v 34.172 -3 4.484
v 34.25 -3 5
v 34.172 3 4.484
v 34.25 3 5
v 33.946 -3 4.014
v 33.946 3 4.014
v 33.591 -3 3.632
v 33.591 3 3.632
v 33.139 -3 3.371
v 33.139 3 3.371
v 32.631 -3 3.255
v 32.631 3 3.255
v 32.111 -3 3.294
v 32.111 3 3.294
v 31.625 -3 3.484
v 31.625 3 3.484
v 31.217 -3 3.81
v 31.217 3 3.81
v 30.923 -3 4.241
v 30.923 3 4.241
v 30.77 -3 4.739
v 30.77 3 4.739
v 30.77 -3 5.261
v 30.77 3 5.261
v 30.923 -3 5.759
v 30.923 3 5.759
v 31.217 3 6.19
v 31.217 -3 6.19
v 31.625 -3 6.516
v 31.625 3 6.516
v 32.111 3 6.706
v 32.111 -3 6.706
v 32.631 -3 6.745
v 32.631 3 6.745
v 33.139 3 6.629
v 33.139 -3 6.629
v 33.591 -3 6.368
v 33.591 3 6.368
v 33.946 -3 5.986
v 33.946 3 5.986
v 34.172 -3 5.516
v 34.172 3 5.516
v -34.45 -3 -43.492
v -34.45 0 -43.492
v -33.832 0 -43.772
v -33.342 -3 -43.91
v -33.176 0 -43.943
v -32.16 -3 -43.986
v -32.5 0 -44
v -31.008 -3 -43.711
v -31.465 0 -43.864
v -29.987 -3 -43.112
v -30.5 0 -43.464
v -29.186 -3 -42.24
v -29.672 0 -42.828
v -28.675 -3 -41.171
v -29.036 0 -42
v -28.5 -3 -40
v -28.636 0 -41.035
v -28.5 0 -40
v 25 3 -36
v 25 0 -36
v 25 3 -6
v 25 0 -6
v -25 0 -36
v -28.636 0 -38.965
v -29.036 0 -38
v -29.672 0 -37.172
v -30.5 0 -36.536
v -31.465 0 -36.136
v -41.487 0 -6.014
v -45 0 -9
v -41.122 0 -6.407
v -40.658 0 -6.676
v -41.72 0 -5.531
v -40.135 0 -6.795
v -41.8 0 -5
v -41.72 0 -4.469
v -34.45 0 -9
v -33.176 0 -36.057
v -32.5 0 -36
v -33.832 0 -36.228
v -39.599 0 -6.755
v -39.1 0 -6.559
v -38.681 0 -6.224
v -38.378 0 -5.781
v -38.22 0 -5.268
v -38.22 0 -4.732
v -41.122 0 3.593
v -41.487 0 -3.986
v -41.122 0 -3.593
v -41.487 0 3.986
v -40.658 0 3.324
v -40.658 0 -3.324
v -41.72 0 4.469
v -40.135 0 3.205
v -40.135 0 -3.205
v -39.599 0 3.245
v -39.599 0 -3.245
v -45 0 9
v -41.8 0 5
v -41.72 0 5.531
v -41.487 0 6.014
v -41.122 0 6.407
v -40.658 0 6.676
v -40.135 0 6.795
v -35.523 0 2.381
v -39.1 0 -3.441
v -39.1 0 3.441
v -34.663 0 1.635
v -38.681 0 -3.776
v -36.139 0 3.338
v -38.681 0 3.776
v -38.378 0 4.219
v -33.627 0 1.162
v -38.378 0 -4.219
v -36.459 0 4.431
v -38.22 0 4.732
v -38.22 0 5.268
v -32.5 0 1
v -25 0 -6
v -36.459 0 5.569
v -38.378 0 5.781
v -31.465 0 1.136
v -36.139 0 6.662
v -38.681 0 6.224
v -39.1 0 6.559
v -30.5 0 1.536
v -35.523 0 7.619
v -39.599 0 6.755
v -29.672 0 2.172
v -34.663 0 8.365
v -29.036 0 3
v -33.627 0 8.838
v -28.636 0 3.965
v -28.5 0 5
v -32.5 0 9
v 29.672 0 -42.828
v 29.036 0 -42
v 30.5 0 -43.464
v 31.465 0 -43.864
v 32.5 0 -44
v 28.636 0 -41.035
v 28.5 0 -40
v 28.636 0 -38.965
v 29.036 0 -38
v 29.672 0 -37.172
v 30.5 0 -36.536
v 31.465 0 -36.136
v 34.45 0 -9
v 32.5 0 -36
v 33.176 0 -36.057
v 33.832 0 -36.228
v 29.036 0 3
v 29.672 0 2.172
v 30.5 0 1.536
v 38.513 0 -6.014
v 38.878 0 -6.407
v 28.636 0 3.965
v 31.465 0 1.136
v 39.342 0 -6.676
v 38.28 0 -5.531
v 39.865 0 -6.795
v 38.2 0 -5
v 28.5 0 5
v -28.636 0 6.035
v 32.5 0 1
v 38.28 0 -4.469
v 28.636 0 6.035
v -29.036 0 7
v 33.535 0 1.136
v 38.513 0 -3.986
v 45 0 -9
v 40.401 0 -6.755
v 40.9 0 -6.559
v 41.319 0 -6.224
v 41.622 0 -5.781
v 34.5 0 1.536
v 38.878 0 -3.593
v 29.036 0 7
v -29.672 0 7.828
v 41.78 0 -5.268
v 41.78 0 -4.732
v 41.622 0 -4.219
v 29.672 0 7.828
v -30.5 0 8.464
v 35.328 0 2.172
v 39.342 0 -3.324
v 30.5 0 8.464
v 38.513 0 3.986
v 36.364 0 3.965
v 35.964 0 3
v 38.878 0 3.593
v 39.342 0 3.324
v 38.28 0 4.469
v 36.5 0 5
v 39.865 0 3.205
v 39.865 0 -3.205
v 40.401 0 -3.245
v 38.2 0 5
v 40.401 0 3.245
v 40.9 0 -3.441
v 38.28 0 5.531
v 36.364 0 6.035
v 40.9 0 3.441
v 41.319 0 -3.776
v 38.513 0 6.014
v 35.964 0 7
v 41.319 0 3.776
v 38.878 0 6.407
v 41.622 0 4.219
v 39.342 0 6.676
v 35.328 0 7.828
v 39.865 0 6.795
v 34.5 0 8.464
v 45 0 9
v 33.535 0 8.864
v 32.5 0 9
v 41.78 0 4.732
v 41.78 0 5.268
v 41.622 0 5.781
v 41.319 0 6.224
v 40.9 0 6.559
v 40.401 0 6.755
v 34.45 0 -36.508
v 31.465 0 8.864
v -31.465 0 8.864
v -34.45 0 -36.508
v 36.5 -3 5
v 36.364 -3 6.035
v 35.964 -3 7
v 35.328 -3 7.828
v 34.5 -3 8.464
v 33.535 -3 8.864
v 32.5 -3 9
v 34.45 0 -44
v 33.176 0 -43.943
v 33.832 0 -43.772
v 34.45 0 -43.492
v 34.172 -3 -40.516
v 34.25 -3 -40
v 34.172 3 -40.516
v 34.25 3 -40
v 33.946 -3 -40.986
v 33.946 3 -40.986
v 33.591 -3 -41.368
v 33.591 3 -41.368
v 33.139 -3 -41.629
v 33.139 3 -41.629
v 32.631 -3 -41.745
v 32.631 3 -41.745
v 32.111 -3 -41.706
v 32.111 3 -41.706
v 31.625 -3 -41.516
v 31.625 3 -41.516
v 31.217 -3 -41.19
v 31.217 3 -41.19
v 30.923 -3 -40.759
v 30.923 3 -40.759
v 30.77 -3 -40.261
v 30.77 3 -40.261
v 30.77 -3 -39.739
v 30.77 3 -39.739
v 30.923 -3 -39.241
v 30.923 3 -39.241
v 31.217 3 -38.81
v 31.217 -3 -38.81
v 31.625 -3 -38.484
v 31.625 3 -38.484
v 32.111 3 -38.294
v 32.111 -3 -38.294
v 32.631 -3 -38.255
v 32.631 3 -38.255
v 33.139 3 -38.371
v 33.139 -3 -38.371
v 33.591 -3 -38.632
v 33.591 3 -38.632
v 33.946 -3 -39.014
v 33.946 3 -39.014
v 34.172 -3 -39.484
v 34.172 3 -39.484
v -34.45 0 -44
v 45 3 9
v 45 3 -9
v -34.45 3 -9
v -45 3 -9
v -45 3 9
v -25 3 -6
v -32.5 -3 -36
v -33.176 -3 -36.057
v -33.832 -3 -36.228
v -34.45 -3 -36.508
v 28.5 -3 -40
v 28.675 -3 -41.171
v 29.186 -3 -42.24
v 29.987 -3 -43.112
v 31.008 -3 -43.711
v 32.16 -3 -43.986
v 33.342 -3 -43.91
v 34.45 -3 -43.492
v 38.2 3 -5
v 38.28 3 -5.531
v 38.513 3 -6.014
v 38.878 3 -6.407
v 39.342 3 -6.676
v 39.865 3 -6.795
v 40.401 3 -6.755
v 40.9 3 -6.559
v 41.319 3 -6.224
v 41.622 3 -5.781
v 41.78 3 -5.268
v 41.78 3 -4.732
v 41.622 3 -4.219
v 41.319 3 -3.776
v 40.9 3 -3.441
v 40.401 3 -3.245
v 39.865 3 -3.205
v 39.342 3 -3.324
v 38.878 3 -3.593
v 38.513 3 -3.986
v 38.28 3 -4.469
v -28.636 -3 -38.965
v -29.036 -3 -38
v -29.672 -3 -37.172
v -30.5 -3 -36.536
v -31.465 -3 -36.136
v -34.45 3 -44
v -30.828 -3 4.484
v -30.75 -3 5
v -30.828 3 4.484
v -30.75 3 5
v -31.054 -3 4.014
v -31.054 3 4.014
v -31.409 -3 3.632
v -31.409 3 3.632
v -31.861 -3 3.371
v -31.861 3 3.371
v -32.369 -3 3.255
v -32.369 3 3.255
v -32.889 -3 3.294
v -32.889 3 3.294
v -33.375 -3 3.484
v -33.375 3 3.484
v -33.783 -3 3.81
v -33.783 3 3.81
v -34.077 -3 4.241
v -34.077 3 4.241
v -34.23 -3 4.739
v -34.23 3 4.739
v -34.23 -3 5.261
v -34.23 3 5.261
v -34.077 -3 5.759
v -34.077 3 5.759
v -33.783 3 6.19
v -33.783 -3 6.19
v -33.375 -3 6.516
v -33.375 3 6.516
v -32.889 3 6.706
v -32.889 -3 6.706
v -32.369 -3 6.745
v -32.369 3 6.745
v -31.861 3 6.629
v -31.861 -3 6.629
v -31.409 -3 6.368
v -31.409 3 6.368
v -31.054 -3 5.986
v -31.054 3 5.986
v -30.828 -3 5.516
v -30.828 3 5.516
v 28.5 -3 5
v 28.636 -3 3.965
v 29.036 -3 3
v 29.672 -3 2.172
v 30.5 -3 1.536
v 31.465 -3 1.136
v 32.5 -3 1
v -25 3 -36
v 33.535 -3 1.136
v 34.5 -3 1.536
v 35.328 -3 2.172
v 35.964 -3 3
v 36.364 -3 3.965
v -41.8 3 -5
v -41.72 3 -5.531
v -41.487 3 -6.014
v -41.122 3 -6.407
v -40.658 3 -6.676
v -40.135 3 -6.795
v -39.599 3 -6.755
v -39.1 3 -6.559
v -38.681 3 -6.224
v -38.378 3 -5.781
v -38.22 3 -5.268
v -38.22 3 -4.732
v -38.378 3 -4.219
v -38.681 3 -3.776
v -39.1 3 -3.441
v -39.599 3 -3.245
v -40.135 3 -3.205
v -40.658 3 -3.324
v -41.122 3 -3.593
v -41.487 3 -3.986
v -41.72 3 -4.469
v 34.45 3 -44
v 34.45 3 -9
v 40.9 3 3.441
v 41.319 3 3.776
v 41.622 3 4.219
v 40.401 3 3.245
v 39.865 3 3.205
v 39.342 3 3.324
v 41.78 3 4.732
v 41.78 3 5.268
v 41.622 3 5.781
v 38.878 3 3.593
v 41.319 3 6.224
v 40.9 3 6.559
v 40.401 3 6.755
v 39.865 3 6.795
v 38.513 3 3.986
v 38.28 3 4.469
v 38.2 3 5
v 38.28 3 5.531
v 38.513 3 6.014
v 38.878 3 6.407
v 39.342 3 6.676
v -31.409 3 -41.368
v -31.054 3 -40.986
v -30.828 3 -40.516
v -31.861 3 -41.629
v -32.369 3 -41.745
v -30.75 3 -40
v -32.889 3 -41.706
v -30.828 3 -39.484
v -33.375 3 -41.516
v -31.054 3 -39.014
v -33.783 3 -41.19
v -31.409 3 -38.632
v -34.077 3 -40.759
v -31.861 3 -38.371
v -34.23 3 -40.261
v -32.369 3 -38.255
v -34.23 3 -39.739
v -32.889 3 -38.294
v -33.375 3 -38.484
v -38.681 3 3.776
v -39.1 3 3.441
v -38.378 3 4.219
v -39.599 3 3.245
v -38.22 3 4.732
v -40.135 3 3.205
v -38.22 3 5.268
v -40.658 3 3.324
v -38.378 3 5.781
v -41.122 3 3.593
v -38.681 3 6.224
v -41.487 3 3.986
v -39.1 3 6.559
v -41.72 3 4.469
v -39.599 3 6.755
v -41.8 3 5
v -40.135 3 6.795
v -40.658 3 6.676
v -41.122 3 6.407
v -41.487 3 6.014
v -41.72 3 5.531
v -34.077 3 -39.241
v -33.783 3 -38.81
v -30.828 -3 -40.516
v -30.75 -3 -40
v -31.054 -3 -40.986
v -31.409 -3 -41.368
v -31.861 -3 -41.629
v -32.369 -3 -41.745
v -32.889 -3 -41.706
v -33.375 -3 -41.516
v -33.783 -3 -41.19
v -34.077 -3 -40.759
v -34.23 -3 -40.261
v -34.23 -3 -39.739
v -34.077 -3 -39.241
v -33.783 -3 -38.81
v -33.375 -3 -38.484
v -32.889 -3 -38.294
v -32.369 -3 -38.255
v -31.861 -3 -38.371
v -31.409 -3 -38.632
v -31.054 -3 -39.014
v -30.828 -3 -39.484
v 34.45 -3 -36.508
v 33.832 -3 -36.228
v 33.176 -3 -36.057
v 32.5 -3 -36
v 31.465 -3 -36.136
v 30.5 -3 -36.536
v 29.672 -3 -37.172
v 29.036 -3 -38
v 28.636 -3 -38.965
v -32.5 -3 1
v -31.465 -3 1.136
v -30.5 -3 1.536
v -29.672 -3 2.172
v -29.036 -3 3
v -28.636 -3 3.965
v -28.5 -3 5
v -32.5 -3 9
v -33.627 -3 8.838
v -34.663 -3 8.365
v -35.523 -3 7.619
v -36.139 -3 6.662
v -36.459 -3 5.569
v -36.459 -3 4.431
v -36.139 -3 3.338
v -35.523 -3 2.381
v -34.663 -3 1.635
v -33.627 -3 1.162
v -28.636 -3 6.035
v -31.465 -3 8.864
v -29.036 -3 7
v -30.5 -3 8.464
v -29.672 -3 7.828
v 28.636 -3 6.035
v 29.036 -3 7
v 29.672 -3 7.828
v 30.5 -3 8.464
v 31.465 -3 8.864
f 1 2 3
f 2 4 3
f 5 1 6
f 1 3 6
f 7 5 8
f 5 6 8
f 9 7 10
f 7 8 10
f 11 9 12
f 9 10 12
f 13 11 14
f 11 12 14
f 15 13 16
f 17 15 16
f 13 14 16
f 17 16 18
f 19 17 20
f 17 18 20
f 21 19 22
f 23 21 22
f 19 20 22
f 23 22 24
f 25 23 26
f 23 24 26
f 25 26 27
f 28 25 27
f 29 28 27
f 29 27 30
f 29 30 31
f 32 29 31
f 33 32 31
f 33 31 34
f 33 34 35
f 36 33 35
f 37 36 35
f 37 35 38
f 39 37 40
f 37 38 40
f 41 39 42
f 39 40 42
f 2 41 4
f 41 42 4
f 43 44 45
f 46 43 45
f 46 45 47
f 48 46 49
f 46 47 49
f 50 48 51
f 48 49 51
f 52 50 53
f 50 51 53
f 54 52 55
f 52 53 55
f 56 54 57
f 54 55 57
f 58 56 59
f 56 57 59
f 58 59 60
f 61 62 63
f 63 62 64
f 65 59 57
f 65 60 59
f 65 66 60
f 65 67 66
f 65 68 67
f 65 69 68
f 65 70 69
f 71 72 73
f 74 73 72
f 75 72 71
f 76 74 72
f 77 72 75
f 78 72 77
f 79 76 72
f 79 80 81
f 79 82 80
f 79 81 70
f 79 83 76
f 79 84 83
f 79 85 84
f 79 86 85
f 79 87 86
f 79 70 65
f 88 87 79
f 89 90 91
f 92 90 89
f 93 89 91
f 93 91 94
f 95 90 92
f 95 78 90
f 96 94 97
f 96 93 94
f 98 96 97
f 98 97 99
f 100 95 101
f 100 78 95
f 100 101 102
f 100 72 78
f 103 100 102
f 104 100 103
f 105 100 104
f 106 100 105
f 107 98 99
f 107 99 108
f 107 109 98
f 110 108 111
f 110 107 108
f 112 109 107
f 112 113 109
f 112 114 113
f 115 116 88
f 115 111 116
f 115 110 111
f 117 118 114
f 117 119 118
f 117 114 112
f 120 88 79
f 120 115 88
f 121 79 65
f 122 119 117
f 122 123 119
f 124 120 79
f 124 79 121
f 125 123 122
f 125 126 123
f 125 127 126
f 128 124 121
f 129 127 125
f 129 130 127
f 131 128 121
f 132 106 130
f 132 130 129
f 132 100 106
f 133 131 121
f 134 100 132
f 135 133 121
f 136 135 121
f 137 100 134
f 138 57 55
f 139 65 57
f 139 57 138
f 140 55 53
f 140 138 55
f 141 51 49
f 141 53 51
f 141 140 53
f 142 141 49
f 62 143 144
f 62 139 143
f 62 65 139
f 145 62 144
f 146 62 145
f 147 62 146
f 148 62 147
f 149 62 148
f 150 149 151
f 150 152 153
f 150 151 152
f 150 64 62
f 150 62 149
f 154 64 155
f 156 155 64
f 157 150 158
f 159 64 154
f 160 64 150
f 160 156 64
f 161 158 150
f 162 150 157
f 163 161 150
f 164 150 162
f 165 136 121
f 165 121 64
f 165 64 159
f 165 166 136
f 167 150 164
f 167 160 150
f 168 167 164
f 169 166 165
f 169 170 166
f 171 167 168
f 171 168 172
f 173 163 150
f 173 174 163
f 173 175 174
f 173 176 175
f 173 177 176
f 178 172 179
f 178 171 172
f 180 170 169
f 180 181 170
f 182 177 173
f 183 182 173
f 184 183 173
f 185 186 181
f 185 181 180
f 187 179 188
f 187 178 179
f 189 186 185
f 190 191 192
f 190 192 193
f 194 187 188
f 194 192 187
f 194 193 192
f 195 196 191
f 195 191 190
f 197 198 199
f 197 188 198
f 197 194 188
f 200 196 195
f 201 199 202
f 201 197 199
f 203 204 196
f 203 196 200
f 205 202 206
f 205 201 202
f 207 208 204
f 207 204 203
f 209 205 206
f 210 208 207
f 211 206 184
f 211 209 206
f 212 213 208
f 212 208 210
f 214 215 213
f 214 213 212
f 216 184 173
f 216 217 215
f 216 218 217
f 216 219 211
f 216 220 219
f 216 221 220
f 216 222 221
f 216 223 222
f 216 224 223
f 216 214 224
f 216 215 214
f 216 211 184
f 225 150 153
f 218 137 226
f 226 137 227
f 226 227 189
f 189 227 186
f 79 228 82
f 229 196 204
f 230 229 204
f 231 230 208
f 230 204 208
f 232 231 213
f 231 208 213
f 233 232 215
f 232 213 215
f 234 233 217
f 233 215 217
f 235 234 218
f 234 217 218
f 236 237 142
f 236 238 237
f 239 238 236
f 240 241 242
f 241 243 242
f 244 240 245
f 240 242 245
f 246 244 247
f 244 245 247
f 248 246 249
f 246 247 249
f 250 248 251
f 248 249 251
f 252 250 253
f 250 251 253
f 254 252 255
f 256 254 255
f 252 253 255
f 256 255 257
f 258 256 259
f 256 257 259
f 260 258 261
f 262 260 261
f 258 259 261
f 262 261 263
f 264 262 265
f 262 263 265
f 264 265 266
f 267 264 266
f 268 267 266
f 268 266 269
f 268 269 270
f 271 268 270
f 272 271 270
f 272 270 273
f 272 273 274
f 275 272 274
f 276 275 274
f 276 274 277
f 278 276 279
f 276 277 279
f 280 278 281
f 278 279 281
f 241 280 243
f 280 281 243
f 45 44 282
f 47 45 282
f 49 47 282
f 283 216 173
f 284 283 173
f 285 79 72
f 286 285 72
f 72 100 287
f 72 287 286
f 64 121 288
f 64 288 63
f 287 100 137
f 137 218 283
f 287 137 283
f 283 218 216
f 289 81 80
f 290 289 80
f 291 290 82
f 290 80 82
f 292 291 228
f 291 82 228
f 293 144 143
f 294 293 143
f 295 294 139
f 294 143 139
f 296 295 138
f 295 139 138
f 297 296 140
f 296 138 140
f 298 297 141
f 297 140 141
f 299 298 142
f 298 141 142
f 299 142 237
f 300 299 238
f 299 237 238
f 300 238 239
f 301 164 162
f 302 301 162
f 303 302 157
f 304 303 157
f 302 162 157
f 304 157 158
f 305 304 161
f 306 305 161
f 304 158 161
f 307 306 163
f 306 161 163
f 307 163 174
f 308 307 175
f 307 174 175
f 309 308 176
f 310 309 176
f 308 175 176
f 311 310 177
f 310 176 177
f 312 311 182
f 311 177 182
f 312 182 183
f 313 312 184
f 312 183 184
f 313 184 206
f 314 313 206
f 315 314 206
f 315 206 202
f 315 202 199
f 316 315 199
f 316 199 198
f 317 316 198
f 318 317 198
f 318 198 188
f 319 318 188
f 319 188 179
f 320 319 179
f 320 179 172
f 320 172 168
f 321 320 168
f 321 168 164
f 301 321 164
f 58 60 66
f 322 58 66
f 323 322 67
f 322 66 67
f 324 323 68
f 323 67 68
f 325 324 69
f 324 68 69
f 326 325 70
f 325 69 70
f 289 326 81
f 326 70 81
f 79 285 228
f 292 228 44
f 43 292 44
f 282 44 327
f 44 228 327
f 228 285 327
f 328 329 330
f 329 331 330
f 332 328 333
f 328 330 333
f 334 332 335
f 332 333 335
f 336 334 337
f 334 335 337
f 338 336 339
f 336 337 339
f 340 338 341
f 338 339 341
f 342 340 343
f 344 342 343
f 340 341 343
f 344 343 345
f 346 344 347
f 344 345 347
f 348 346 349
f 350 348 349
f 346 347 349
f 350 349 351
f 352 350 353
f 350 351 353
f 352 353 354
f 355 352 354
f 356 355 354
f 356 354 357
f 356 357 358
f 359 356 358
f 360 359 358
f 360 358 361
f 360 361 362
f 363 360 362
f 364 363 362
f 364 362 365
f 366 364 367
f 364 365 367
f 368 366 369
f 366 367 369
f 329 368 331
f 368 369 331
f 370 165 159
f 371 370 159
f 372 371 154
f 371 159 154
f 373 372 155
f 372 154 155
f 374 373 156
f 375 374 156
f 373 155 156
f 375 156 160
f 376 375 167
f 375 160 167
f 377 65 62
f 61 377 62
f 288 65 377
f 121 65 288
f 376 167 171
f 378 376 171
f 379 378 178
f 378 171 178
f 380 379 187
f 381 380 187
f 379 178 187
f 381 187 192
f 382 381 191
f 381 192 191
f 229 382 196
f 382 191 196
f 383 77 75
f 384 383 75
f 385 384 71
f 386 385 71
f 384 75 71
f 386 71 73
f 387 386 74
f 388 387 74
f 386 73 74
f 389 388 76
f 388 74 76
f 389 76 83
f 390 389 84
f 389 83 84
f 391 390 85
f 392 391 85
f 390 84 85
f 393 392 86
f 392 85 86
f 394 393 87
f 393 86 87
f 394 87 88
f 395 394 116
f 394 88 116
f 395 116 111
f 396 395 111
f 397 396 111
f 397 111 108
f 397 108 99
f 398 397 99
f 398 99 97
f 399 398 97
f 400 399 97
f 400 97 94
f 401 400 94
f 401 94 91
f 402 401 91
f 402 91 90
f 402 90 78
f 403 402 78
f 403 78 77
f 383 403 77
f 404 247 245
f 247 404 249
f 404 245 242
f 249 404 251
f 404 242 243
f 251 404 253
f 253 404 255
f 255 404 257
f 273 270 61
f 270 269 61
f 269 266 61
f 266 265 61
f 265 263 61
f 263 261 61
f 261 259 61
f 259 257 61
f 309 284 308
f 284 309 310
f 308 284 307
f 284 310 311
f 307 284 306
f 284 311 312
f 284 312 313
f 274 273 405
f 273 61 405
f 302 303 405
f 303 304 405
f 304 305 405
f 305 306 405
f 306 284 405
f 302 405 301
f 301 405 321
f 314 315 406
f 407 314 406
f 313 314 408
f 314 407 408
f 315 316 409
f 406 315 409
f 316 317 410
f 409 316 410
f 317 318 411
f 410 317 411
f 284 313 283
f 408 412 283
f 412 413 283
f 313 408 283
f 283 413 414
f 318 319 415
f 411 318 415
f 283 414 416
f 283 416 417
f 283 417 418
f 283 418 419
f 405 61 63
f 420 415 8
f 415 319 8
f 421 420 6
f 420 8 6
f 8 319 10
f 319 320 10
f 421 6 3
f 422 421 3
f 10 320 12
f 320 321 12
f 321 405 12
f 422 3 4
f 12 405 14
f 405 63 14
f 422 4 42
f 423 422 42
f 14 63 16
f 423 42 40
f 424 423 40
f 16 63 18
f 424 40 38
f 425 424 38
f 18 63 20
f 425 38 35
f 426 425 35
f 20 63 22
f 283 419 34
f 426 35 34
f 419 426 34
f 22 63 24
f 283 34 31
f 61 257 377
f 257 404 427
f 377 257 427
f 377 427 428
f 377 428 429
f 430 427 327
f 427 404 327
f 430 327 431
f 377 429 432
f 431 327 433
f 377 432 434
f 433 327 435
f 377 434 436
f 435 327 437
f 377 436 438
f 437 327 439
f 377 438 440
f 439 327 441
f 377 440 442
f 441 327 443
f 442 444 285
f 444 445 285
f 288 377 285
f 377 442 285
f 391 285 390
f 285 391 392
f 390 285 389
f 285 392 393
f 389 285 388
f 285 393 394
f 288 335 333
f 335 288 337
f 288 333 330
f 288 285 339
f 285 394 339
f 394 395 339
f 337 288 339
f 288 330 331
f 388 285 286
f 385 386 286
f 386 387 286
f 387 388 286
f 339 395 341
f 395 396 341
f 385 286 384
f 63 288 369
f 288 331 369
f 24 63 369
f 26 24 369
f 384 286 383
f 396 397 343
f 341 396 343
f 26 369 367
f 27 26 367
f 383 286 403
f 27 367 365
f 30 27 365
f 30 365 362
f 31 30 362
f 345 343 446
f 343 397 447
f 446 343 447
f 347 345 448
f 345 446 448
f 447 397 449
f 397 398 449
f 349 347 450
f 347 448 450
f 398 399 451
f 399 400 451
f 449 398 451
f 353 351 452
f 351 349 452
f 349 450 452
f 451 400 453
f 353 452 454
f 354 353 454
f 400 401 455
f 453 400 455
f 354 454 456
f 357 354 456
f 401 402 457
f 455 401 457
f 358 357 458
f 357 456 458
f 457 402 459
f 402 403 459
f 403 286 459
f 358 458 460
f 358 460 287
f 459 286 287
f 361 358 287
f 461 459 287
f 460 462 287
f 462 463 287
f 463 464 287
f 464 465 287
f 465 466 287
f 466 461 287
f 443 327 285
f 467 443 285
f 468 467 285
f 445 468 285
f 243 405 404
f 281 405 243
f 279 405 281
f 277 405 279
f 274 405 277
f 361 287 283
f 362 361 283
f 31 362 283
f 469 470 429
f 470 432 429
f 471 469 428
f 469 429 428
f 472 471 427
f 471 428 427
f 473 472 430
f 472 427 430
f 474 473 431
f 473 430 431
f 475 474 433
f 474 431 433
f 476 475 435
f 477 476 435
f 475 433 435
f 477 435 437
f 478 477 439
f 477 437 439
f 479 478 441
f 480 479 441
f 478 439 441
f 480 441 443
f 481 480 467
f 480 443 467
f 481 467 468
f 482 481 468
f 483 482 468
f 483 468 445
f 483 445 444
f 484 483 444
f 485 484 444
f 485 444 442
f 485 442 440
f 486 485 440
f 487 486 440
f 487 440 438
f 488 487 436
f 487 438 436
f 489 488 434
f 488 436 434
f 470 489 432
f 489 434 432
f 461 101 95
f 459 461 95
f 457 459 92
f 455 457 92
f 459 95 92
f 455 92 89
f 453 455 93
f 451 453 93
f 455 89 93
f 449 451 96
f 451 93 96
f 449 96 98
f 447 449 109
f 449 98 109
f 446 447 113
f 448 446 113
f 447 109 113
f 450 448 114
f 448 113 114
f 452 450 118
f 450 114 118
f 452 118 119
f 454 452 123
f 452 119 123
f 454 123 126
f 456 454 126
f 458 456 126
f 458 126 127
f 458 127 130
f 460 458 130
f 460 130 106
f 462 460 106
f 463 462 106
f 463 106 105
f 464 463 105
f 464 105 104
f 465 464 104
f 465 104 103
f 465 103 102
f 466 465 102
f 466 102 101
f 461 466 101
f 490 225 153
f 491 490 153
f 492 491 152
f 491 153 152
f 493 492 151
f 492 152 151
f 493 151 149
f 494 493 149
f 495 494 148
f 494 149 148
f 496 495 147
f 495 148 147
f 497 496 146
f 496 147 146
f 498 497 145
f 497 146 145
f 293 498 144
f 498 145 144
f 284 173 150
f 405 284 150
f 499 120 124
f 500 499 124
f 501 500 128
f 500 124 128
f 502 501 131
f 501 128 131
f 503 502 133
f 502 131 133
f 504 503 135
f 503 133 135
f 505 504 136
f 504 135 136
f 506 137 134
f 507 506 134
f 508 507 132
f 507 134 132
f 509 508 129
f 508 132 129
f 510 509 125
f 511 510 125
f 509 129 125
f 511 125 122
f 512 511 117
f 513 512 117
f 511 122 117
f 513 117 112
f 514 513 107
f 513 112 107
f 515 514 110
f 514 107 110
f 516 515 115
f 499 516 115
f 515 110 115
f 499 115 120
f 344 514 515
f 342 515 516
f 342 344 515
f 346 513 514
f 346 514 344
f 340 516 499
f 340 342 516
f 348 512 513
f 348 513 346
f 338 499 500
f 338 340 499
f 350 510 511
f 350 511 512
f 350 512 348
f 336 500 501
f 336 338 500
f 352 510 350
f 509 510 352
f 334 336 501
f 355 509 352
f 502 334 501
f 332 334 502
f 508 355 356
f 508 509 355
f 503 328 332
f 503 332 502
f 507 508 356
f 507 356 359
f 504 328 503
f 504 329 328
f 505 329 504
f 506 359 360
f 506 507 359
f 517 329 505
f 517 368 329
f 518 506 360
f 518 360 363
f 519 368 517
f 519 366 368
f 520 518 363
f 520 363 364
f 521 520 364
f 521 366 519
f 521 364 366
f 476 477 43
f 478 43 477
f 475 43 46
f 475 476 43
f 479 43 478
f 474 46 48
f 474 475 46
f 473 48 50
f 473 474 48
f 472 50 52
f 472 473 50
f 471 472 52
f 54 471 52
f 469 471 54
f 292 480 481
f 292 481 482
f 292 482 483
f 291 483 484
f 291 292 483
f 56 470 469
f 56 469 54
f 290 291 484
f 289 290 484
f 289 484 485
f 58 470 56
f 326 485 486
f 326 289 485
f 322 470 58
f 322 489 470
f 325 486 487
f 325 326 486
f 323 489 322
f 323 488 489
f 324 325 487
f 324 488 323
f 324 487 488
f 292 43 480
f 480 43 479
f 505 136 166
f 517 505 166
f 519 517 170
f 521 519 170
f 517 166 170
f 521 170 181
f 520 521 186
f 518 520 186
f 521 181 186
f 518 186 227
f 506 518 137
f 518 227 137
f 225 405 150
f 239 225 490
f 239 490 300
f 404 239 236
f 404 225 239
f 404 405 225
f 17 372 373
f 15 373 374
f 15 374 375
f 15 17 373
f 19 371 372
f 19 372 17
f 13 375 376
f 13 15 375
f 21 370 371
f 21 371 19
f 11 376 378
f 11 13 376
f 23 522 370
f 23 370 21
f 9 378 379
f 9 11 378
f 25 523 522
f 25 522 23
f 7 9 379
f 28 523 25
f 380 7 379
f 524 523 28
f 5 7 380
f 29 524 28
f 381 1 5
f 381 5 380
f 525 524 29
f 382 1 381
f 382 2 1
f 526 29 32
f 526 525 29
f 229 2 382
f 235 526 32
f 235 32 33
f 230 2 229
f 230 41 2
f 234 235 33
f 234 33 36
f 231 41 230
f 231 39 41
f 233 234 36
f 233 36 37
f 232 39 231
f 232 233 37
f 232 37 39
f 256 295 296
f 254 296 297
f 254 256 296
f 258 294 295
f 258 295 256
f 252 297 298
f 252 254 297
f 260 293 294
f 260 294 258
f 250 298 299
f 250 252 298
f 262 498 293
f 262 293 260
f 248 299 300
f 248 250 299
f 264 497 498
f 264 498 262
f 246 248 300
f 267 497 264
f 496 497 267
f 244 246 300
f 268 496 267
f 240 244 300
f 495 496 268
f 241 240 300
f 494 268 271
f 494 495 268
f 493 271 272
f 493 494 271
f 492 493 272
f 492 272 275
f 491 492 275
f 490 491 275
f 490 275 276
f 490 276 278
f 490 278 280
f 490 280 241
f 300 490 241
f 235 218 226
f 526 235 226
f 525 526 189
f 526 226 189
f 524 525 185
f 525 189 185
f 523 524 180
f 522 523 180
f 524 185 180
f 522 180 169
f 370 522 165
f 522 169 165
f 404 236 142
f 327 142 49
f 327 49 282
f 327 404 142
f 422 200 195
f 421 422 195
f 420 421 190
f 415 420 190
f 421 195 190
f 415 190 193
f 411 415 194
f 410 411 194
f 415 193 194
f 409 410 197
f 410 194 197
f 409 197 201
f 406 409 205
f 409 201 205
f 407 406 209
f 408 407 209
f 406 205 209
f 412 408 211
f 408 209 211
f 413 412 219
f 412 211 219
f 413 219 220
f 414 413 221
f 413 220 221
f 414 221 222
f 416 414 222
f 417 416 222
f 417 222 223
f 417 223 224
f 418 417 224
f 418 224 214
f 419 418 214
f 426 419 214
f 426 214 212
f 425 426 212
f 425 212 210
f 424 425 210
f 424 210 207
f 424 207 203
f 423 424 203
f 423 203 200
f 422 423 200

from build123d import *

# Parameters (mm, degrees)
SKETCH1_W                 = 90
SKETCH1_H                 = 18
BOSS_EXTRUDE1_DEPTH       = 3
SKETCH1_3_W               = 69.7
SKETCH1_3_H               = 18
BOSS_EXTRUDE2_DEPTH       = 8
M3_CLEARANCE_HOLE1_D      = 3.6
M3_CLEARANCE_HOLE1_DEPTH  = 10
M3_CLEARANCE_HOLE1_TIP    = 1.081549114
SKETCH6_W                 = 69.7
SKETCH6_H                 = 37
BOSS_EXTRUDE3_DEPTH       = 5
SKETCH9_R                 = 4
BOSS_EXTRUDE4_DEPTH       = 3
F_3_0MM_DOWEL_HOLE1_D     = 3.5
F_3_0MM_DOWEL_HOLE1_DEPTH = 6
F_3_0MM_DOWEL_HOLE1_TIP   = 1.051506083
SKETCH12_W                = 50
SKETCH12_H                = 30
CUT_EXTRUDE1_DEPTH        = 65.845971347
CUT_EXTRUDE2_DEPTH        = 93.498770262
SKETCH15_W                = 69.7
SKETCH15_H                = 3
CUT_EXTRUDE3_DEPTH        = 2
SKETCH16_W                = 35
SKETCH16_H                = 8.236372104
CUT_EXTRUDE4_DEPTH        = 0.4


with BuildPart() as part:
    # Sketch1 → Boss-Extrude1 (new body)
    with BuildSketch(Plane(origin=(0, 0, 0), x_dir=(1, 0, 0), z_dir=(0, 1, 0))):
        Rectangle(SKETCH1_W, SKETCH1_H)
    extrude(amount=BOSS_EXTRUDE1_DEPTH)

    # Sketch1<3> → Boss-Extrude2 (add)
    with BuildSketch(Plane(origin=(0, 0, 0), x_dir=(1, 0, 0), z_dir=(0, 1, 0))):
        Rectangle(SKETCH1_3_W, SKETCH1_3_H)
    extrude(amount=BOSS_EXTRUDE2_DEPTH)

    # M3 Clearance Hole1
    with Locations(Plane(origin=(0, 3, 0), x_dir=(1, 0, 0), z_dir=(0, 1, 0))):
        with Locations((-40, 5), (-40, -5), (40, -5), (40, 5)):
            Hole(M3_CLEARANCE_HOLE1_D / 2, depth=M3_CLEARANCE_HOLE1_DEPTH)
            with Locations((0, 0, -(M3_CLEARANCE_HOLE1_DEPTH + M3_CLEARANCE_HOLE1_TIP / 2))):  # 118° drill point
                Cone(0, M3_CLEARANCE_HOLE1_D / 2, M3_CLEARANCE_HOLE1_TIP, mode=Mode.SUBTRACT)

    # Sketch6 → Boss-Extrude3 (add)
    with BuildSketch(Plane.XZ):
        with Locations((0, -27.5)):
            Rectangle(SKETCH6_W, SKETCH6_H)
    extrude(amount=-BOSS_EXTRUDE3_DEPTH)

    # Sketch9 → Boss-Extrude4 (add)
    with BuildSketch(Plane.XZ):
        with Locations((-32.5, 5)):
            Circle(SKETCH9_R)
        with Locations((32.5, 5)):
            Circle(SKETCH9_R)
        with BuildLine():
            Line((-34.85, -36.763103338), (-34.85, -43.236896662))
            ThreePointArc((-34.85, -43.236896662), (-28.5, -40), (-34.85, -36.763103338))
        make_face()
        with BuildLine():
            ThreePointArc((34.85, -36.763103338), (28.5, -40), (34.85, -43.236896662))
            Line((34.85, -43.236896662), (34.85, -36.763103338))
        make_face()
    extrude(amount=BOSS_EXTRUDE4_DEPTH)

    # Ø3.0mm Dowel Hole1
    with Locations(Plane(origin=(0, -3, 0), x_dir=(-1, 0, 0), z_dir=(0, -1, 0))):
        with Locations((-32.5, -5), (32.5, -5), (32.5, 40), (-32.5, 40)):
            Hole(F_3_0MM_DOWEL_HOLE1_D / 2, depth=F_3_0MM_DOWEL_HOLE1_DEPTH)
            with Locations((0, 0, -(F_3_0MM_DOWEL_HOLE1_DEPTH + F_3_0MM_DOWEL_HOLE1_TIP / 2))):  # 118° drill point
                Cone(0, F_3_0MM_DOWEL_HOLE1_D / 2, F_3_0MM_DOWEL_HOLE1_TIP, mode=Mode.SUBTRACT)

    # Sketch12 → Cut-Extrude1 (cut, through all)
    with BuildSketch(Plane.XZ):
        with Locations((0, -21)):
            Rectangle(SKETCH12_W, SKETCH12_H)
    extrude(amount=-CUT_EXTRUDE1_DEPTH, mode=Mode.SUBTRACT)

    # Sketch14 → Cut-Extrude2 (cut, through all)
    with BuildSketch(Plane.ZY.offset(34.85)):
        Polygon((9, 3), (9, 8), (-9, 8), (-9, 5), (-46, 5), (-46, 3), (-9, 3), align=None)
    extrude(amount=-CUT_EXTRUDE2_DEPTH, mode=Mode.SUBTRACT)

    # Sketch15 → Cut-Extrude3 (cut)
    with BuildSketch(Plane(origin=(0, 0, -46), x_dir=(-1, 0, 0), z_dir=(0, 0, -1))):
        with Locations((0, 1.5)):
            Rectangle(SKETCH15_W, SKETCH15_H)
    extrude(amount=-CUT_EXTRUDE3_DEPTH, mode=Mode.SUBTRACT)

    # Sketch16 → Cut-Extrude4 (cut)
    with BuildSketch(Plane(origin=(34.85, 0, 0), x_dir=(0, 0, -1), z_dir=(1, 0, 0))):
        with Locations((26.5, -1.118186052)):
            Rectangle(SKETCH16_W, SKETCH16_H)
    cut_extrude4 = extrude(amount=-CUT_EXTRUDE4_DEPTH, mode=Mode.SUBTRACT)

    # Mirror1: Cut-Extrude4 across plane
    add(cut_extrude4.mirror(Plane(origin=(0, 0, 0), x_dir=(0, 0, 1), z_dir=(1, 0, 0))), mode=Mode.SUBTRACT)


solid = part.part
